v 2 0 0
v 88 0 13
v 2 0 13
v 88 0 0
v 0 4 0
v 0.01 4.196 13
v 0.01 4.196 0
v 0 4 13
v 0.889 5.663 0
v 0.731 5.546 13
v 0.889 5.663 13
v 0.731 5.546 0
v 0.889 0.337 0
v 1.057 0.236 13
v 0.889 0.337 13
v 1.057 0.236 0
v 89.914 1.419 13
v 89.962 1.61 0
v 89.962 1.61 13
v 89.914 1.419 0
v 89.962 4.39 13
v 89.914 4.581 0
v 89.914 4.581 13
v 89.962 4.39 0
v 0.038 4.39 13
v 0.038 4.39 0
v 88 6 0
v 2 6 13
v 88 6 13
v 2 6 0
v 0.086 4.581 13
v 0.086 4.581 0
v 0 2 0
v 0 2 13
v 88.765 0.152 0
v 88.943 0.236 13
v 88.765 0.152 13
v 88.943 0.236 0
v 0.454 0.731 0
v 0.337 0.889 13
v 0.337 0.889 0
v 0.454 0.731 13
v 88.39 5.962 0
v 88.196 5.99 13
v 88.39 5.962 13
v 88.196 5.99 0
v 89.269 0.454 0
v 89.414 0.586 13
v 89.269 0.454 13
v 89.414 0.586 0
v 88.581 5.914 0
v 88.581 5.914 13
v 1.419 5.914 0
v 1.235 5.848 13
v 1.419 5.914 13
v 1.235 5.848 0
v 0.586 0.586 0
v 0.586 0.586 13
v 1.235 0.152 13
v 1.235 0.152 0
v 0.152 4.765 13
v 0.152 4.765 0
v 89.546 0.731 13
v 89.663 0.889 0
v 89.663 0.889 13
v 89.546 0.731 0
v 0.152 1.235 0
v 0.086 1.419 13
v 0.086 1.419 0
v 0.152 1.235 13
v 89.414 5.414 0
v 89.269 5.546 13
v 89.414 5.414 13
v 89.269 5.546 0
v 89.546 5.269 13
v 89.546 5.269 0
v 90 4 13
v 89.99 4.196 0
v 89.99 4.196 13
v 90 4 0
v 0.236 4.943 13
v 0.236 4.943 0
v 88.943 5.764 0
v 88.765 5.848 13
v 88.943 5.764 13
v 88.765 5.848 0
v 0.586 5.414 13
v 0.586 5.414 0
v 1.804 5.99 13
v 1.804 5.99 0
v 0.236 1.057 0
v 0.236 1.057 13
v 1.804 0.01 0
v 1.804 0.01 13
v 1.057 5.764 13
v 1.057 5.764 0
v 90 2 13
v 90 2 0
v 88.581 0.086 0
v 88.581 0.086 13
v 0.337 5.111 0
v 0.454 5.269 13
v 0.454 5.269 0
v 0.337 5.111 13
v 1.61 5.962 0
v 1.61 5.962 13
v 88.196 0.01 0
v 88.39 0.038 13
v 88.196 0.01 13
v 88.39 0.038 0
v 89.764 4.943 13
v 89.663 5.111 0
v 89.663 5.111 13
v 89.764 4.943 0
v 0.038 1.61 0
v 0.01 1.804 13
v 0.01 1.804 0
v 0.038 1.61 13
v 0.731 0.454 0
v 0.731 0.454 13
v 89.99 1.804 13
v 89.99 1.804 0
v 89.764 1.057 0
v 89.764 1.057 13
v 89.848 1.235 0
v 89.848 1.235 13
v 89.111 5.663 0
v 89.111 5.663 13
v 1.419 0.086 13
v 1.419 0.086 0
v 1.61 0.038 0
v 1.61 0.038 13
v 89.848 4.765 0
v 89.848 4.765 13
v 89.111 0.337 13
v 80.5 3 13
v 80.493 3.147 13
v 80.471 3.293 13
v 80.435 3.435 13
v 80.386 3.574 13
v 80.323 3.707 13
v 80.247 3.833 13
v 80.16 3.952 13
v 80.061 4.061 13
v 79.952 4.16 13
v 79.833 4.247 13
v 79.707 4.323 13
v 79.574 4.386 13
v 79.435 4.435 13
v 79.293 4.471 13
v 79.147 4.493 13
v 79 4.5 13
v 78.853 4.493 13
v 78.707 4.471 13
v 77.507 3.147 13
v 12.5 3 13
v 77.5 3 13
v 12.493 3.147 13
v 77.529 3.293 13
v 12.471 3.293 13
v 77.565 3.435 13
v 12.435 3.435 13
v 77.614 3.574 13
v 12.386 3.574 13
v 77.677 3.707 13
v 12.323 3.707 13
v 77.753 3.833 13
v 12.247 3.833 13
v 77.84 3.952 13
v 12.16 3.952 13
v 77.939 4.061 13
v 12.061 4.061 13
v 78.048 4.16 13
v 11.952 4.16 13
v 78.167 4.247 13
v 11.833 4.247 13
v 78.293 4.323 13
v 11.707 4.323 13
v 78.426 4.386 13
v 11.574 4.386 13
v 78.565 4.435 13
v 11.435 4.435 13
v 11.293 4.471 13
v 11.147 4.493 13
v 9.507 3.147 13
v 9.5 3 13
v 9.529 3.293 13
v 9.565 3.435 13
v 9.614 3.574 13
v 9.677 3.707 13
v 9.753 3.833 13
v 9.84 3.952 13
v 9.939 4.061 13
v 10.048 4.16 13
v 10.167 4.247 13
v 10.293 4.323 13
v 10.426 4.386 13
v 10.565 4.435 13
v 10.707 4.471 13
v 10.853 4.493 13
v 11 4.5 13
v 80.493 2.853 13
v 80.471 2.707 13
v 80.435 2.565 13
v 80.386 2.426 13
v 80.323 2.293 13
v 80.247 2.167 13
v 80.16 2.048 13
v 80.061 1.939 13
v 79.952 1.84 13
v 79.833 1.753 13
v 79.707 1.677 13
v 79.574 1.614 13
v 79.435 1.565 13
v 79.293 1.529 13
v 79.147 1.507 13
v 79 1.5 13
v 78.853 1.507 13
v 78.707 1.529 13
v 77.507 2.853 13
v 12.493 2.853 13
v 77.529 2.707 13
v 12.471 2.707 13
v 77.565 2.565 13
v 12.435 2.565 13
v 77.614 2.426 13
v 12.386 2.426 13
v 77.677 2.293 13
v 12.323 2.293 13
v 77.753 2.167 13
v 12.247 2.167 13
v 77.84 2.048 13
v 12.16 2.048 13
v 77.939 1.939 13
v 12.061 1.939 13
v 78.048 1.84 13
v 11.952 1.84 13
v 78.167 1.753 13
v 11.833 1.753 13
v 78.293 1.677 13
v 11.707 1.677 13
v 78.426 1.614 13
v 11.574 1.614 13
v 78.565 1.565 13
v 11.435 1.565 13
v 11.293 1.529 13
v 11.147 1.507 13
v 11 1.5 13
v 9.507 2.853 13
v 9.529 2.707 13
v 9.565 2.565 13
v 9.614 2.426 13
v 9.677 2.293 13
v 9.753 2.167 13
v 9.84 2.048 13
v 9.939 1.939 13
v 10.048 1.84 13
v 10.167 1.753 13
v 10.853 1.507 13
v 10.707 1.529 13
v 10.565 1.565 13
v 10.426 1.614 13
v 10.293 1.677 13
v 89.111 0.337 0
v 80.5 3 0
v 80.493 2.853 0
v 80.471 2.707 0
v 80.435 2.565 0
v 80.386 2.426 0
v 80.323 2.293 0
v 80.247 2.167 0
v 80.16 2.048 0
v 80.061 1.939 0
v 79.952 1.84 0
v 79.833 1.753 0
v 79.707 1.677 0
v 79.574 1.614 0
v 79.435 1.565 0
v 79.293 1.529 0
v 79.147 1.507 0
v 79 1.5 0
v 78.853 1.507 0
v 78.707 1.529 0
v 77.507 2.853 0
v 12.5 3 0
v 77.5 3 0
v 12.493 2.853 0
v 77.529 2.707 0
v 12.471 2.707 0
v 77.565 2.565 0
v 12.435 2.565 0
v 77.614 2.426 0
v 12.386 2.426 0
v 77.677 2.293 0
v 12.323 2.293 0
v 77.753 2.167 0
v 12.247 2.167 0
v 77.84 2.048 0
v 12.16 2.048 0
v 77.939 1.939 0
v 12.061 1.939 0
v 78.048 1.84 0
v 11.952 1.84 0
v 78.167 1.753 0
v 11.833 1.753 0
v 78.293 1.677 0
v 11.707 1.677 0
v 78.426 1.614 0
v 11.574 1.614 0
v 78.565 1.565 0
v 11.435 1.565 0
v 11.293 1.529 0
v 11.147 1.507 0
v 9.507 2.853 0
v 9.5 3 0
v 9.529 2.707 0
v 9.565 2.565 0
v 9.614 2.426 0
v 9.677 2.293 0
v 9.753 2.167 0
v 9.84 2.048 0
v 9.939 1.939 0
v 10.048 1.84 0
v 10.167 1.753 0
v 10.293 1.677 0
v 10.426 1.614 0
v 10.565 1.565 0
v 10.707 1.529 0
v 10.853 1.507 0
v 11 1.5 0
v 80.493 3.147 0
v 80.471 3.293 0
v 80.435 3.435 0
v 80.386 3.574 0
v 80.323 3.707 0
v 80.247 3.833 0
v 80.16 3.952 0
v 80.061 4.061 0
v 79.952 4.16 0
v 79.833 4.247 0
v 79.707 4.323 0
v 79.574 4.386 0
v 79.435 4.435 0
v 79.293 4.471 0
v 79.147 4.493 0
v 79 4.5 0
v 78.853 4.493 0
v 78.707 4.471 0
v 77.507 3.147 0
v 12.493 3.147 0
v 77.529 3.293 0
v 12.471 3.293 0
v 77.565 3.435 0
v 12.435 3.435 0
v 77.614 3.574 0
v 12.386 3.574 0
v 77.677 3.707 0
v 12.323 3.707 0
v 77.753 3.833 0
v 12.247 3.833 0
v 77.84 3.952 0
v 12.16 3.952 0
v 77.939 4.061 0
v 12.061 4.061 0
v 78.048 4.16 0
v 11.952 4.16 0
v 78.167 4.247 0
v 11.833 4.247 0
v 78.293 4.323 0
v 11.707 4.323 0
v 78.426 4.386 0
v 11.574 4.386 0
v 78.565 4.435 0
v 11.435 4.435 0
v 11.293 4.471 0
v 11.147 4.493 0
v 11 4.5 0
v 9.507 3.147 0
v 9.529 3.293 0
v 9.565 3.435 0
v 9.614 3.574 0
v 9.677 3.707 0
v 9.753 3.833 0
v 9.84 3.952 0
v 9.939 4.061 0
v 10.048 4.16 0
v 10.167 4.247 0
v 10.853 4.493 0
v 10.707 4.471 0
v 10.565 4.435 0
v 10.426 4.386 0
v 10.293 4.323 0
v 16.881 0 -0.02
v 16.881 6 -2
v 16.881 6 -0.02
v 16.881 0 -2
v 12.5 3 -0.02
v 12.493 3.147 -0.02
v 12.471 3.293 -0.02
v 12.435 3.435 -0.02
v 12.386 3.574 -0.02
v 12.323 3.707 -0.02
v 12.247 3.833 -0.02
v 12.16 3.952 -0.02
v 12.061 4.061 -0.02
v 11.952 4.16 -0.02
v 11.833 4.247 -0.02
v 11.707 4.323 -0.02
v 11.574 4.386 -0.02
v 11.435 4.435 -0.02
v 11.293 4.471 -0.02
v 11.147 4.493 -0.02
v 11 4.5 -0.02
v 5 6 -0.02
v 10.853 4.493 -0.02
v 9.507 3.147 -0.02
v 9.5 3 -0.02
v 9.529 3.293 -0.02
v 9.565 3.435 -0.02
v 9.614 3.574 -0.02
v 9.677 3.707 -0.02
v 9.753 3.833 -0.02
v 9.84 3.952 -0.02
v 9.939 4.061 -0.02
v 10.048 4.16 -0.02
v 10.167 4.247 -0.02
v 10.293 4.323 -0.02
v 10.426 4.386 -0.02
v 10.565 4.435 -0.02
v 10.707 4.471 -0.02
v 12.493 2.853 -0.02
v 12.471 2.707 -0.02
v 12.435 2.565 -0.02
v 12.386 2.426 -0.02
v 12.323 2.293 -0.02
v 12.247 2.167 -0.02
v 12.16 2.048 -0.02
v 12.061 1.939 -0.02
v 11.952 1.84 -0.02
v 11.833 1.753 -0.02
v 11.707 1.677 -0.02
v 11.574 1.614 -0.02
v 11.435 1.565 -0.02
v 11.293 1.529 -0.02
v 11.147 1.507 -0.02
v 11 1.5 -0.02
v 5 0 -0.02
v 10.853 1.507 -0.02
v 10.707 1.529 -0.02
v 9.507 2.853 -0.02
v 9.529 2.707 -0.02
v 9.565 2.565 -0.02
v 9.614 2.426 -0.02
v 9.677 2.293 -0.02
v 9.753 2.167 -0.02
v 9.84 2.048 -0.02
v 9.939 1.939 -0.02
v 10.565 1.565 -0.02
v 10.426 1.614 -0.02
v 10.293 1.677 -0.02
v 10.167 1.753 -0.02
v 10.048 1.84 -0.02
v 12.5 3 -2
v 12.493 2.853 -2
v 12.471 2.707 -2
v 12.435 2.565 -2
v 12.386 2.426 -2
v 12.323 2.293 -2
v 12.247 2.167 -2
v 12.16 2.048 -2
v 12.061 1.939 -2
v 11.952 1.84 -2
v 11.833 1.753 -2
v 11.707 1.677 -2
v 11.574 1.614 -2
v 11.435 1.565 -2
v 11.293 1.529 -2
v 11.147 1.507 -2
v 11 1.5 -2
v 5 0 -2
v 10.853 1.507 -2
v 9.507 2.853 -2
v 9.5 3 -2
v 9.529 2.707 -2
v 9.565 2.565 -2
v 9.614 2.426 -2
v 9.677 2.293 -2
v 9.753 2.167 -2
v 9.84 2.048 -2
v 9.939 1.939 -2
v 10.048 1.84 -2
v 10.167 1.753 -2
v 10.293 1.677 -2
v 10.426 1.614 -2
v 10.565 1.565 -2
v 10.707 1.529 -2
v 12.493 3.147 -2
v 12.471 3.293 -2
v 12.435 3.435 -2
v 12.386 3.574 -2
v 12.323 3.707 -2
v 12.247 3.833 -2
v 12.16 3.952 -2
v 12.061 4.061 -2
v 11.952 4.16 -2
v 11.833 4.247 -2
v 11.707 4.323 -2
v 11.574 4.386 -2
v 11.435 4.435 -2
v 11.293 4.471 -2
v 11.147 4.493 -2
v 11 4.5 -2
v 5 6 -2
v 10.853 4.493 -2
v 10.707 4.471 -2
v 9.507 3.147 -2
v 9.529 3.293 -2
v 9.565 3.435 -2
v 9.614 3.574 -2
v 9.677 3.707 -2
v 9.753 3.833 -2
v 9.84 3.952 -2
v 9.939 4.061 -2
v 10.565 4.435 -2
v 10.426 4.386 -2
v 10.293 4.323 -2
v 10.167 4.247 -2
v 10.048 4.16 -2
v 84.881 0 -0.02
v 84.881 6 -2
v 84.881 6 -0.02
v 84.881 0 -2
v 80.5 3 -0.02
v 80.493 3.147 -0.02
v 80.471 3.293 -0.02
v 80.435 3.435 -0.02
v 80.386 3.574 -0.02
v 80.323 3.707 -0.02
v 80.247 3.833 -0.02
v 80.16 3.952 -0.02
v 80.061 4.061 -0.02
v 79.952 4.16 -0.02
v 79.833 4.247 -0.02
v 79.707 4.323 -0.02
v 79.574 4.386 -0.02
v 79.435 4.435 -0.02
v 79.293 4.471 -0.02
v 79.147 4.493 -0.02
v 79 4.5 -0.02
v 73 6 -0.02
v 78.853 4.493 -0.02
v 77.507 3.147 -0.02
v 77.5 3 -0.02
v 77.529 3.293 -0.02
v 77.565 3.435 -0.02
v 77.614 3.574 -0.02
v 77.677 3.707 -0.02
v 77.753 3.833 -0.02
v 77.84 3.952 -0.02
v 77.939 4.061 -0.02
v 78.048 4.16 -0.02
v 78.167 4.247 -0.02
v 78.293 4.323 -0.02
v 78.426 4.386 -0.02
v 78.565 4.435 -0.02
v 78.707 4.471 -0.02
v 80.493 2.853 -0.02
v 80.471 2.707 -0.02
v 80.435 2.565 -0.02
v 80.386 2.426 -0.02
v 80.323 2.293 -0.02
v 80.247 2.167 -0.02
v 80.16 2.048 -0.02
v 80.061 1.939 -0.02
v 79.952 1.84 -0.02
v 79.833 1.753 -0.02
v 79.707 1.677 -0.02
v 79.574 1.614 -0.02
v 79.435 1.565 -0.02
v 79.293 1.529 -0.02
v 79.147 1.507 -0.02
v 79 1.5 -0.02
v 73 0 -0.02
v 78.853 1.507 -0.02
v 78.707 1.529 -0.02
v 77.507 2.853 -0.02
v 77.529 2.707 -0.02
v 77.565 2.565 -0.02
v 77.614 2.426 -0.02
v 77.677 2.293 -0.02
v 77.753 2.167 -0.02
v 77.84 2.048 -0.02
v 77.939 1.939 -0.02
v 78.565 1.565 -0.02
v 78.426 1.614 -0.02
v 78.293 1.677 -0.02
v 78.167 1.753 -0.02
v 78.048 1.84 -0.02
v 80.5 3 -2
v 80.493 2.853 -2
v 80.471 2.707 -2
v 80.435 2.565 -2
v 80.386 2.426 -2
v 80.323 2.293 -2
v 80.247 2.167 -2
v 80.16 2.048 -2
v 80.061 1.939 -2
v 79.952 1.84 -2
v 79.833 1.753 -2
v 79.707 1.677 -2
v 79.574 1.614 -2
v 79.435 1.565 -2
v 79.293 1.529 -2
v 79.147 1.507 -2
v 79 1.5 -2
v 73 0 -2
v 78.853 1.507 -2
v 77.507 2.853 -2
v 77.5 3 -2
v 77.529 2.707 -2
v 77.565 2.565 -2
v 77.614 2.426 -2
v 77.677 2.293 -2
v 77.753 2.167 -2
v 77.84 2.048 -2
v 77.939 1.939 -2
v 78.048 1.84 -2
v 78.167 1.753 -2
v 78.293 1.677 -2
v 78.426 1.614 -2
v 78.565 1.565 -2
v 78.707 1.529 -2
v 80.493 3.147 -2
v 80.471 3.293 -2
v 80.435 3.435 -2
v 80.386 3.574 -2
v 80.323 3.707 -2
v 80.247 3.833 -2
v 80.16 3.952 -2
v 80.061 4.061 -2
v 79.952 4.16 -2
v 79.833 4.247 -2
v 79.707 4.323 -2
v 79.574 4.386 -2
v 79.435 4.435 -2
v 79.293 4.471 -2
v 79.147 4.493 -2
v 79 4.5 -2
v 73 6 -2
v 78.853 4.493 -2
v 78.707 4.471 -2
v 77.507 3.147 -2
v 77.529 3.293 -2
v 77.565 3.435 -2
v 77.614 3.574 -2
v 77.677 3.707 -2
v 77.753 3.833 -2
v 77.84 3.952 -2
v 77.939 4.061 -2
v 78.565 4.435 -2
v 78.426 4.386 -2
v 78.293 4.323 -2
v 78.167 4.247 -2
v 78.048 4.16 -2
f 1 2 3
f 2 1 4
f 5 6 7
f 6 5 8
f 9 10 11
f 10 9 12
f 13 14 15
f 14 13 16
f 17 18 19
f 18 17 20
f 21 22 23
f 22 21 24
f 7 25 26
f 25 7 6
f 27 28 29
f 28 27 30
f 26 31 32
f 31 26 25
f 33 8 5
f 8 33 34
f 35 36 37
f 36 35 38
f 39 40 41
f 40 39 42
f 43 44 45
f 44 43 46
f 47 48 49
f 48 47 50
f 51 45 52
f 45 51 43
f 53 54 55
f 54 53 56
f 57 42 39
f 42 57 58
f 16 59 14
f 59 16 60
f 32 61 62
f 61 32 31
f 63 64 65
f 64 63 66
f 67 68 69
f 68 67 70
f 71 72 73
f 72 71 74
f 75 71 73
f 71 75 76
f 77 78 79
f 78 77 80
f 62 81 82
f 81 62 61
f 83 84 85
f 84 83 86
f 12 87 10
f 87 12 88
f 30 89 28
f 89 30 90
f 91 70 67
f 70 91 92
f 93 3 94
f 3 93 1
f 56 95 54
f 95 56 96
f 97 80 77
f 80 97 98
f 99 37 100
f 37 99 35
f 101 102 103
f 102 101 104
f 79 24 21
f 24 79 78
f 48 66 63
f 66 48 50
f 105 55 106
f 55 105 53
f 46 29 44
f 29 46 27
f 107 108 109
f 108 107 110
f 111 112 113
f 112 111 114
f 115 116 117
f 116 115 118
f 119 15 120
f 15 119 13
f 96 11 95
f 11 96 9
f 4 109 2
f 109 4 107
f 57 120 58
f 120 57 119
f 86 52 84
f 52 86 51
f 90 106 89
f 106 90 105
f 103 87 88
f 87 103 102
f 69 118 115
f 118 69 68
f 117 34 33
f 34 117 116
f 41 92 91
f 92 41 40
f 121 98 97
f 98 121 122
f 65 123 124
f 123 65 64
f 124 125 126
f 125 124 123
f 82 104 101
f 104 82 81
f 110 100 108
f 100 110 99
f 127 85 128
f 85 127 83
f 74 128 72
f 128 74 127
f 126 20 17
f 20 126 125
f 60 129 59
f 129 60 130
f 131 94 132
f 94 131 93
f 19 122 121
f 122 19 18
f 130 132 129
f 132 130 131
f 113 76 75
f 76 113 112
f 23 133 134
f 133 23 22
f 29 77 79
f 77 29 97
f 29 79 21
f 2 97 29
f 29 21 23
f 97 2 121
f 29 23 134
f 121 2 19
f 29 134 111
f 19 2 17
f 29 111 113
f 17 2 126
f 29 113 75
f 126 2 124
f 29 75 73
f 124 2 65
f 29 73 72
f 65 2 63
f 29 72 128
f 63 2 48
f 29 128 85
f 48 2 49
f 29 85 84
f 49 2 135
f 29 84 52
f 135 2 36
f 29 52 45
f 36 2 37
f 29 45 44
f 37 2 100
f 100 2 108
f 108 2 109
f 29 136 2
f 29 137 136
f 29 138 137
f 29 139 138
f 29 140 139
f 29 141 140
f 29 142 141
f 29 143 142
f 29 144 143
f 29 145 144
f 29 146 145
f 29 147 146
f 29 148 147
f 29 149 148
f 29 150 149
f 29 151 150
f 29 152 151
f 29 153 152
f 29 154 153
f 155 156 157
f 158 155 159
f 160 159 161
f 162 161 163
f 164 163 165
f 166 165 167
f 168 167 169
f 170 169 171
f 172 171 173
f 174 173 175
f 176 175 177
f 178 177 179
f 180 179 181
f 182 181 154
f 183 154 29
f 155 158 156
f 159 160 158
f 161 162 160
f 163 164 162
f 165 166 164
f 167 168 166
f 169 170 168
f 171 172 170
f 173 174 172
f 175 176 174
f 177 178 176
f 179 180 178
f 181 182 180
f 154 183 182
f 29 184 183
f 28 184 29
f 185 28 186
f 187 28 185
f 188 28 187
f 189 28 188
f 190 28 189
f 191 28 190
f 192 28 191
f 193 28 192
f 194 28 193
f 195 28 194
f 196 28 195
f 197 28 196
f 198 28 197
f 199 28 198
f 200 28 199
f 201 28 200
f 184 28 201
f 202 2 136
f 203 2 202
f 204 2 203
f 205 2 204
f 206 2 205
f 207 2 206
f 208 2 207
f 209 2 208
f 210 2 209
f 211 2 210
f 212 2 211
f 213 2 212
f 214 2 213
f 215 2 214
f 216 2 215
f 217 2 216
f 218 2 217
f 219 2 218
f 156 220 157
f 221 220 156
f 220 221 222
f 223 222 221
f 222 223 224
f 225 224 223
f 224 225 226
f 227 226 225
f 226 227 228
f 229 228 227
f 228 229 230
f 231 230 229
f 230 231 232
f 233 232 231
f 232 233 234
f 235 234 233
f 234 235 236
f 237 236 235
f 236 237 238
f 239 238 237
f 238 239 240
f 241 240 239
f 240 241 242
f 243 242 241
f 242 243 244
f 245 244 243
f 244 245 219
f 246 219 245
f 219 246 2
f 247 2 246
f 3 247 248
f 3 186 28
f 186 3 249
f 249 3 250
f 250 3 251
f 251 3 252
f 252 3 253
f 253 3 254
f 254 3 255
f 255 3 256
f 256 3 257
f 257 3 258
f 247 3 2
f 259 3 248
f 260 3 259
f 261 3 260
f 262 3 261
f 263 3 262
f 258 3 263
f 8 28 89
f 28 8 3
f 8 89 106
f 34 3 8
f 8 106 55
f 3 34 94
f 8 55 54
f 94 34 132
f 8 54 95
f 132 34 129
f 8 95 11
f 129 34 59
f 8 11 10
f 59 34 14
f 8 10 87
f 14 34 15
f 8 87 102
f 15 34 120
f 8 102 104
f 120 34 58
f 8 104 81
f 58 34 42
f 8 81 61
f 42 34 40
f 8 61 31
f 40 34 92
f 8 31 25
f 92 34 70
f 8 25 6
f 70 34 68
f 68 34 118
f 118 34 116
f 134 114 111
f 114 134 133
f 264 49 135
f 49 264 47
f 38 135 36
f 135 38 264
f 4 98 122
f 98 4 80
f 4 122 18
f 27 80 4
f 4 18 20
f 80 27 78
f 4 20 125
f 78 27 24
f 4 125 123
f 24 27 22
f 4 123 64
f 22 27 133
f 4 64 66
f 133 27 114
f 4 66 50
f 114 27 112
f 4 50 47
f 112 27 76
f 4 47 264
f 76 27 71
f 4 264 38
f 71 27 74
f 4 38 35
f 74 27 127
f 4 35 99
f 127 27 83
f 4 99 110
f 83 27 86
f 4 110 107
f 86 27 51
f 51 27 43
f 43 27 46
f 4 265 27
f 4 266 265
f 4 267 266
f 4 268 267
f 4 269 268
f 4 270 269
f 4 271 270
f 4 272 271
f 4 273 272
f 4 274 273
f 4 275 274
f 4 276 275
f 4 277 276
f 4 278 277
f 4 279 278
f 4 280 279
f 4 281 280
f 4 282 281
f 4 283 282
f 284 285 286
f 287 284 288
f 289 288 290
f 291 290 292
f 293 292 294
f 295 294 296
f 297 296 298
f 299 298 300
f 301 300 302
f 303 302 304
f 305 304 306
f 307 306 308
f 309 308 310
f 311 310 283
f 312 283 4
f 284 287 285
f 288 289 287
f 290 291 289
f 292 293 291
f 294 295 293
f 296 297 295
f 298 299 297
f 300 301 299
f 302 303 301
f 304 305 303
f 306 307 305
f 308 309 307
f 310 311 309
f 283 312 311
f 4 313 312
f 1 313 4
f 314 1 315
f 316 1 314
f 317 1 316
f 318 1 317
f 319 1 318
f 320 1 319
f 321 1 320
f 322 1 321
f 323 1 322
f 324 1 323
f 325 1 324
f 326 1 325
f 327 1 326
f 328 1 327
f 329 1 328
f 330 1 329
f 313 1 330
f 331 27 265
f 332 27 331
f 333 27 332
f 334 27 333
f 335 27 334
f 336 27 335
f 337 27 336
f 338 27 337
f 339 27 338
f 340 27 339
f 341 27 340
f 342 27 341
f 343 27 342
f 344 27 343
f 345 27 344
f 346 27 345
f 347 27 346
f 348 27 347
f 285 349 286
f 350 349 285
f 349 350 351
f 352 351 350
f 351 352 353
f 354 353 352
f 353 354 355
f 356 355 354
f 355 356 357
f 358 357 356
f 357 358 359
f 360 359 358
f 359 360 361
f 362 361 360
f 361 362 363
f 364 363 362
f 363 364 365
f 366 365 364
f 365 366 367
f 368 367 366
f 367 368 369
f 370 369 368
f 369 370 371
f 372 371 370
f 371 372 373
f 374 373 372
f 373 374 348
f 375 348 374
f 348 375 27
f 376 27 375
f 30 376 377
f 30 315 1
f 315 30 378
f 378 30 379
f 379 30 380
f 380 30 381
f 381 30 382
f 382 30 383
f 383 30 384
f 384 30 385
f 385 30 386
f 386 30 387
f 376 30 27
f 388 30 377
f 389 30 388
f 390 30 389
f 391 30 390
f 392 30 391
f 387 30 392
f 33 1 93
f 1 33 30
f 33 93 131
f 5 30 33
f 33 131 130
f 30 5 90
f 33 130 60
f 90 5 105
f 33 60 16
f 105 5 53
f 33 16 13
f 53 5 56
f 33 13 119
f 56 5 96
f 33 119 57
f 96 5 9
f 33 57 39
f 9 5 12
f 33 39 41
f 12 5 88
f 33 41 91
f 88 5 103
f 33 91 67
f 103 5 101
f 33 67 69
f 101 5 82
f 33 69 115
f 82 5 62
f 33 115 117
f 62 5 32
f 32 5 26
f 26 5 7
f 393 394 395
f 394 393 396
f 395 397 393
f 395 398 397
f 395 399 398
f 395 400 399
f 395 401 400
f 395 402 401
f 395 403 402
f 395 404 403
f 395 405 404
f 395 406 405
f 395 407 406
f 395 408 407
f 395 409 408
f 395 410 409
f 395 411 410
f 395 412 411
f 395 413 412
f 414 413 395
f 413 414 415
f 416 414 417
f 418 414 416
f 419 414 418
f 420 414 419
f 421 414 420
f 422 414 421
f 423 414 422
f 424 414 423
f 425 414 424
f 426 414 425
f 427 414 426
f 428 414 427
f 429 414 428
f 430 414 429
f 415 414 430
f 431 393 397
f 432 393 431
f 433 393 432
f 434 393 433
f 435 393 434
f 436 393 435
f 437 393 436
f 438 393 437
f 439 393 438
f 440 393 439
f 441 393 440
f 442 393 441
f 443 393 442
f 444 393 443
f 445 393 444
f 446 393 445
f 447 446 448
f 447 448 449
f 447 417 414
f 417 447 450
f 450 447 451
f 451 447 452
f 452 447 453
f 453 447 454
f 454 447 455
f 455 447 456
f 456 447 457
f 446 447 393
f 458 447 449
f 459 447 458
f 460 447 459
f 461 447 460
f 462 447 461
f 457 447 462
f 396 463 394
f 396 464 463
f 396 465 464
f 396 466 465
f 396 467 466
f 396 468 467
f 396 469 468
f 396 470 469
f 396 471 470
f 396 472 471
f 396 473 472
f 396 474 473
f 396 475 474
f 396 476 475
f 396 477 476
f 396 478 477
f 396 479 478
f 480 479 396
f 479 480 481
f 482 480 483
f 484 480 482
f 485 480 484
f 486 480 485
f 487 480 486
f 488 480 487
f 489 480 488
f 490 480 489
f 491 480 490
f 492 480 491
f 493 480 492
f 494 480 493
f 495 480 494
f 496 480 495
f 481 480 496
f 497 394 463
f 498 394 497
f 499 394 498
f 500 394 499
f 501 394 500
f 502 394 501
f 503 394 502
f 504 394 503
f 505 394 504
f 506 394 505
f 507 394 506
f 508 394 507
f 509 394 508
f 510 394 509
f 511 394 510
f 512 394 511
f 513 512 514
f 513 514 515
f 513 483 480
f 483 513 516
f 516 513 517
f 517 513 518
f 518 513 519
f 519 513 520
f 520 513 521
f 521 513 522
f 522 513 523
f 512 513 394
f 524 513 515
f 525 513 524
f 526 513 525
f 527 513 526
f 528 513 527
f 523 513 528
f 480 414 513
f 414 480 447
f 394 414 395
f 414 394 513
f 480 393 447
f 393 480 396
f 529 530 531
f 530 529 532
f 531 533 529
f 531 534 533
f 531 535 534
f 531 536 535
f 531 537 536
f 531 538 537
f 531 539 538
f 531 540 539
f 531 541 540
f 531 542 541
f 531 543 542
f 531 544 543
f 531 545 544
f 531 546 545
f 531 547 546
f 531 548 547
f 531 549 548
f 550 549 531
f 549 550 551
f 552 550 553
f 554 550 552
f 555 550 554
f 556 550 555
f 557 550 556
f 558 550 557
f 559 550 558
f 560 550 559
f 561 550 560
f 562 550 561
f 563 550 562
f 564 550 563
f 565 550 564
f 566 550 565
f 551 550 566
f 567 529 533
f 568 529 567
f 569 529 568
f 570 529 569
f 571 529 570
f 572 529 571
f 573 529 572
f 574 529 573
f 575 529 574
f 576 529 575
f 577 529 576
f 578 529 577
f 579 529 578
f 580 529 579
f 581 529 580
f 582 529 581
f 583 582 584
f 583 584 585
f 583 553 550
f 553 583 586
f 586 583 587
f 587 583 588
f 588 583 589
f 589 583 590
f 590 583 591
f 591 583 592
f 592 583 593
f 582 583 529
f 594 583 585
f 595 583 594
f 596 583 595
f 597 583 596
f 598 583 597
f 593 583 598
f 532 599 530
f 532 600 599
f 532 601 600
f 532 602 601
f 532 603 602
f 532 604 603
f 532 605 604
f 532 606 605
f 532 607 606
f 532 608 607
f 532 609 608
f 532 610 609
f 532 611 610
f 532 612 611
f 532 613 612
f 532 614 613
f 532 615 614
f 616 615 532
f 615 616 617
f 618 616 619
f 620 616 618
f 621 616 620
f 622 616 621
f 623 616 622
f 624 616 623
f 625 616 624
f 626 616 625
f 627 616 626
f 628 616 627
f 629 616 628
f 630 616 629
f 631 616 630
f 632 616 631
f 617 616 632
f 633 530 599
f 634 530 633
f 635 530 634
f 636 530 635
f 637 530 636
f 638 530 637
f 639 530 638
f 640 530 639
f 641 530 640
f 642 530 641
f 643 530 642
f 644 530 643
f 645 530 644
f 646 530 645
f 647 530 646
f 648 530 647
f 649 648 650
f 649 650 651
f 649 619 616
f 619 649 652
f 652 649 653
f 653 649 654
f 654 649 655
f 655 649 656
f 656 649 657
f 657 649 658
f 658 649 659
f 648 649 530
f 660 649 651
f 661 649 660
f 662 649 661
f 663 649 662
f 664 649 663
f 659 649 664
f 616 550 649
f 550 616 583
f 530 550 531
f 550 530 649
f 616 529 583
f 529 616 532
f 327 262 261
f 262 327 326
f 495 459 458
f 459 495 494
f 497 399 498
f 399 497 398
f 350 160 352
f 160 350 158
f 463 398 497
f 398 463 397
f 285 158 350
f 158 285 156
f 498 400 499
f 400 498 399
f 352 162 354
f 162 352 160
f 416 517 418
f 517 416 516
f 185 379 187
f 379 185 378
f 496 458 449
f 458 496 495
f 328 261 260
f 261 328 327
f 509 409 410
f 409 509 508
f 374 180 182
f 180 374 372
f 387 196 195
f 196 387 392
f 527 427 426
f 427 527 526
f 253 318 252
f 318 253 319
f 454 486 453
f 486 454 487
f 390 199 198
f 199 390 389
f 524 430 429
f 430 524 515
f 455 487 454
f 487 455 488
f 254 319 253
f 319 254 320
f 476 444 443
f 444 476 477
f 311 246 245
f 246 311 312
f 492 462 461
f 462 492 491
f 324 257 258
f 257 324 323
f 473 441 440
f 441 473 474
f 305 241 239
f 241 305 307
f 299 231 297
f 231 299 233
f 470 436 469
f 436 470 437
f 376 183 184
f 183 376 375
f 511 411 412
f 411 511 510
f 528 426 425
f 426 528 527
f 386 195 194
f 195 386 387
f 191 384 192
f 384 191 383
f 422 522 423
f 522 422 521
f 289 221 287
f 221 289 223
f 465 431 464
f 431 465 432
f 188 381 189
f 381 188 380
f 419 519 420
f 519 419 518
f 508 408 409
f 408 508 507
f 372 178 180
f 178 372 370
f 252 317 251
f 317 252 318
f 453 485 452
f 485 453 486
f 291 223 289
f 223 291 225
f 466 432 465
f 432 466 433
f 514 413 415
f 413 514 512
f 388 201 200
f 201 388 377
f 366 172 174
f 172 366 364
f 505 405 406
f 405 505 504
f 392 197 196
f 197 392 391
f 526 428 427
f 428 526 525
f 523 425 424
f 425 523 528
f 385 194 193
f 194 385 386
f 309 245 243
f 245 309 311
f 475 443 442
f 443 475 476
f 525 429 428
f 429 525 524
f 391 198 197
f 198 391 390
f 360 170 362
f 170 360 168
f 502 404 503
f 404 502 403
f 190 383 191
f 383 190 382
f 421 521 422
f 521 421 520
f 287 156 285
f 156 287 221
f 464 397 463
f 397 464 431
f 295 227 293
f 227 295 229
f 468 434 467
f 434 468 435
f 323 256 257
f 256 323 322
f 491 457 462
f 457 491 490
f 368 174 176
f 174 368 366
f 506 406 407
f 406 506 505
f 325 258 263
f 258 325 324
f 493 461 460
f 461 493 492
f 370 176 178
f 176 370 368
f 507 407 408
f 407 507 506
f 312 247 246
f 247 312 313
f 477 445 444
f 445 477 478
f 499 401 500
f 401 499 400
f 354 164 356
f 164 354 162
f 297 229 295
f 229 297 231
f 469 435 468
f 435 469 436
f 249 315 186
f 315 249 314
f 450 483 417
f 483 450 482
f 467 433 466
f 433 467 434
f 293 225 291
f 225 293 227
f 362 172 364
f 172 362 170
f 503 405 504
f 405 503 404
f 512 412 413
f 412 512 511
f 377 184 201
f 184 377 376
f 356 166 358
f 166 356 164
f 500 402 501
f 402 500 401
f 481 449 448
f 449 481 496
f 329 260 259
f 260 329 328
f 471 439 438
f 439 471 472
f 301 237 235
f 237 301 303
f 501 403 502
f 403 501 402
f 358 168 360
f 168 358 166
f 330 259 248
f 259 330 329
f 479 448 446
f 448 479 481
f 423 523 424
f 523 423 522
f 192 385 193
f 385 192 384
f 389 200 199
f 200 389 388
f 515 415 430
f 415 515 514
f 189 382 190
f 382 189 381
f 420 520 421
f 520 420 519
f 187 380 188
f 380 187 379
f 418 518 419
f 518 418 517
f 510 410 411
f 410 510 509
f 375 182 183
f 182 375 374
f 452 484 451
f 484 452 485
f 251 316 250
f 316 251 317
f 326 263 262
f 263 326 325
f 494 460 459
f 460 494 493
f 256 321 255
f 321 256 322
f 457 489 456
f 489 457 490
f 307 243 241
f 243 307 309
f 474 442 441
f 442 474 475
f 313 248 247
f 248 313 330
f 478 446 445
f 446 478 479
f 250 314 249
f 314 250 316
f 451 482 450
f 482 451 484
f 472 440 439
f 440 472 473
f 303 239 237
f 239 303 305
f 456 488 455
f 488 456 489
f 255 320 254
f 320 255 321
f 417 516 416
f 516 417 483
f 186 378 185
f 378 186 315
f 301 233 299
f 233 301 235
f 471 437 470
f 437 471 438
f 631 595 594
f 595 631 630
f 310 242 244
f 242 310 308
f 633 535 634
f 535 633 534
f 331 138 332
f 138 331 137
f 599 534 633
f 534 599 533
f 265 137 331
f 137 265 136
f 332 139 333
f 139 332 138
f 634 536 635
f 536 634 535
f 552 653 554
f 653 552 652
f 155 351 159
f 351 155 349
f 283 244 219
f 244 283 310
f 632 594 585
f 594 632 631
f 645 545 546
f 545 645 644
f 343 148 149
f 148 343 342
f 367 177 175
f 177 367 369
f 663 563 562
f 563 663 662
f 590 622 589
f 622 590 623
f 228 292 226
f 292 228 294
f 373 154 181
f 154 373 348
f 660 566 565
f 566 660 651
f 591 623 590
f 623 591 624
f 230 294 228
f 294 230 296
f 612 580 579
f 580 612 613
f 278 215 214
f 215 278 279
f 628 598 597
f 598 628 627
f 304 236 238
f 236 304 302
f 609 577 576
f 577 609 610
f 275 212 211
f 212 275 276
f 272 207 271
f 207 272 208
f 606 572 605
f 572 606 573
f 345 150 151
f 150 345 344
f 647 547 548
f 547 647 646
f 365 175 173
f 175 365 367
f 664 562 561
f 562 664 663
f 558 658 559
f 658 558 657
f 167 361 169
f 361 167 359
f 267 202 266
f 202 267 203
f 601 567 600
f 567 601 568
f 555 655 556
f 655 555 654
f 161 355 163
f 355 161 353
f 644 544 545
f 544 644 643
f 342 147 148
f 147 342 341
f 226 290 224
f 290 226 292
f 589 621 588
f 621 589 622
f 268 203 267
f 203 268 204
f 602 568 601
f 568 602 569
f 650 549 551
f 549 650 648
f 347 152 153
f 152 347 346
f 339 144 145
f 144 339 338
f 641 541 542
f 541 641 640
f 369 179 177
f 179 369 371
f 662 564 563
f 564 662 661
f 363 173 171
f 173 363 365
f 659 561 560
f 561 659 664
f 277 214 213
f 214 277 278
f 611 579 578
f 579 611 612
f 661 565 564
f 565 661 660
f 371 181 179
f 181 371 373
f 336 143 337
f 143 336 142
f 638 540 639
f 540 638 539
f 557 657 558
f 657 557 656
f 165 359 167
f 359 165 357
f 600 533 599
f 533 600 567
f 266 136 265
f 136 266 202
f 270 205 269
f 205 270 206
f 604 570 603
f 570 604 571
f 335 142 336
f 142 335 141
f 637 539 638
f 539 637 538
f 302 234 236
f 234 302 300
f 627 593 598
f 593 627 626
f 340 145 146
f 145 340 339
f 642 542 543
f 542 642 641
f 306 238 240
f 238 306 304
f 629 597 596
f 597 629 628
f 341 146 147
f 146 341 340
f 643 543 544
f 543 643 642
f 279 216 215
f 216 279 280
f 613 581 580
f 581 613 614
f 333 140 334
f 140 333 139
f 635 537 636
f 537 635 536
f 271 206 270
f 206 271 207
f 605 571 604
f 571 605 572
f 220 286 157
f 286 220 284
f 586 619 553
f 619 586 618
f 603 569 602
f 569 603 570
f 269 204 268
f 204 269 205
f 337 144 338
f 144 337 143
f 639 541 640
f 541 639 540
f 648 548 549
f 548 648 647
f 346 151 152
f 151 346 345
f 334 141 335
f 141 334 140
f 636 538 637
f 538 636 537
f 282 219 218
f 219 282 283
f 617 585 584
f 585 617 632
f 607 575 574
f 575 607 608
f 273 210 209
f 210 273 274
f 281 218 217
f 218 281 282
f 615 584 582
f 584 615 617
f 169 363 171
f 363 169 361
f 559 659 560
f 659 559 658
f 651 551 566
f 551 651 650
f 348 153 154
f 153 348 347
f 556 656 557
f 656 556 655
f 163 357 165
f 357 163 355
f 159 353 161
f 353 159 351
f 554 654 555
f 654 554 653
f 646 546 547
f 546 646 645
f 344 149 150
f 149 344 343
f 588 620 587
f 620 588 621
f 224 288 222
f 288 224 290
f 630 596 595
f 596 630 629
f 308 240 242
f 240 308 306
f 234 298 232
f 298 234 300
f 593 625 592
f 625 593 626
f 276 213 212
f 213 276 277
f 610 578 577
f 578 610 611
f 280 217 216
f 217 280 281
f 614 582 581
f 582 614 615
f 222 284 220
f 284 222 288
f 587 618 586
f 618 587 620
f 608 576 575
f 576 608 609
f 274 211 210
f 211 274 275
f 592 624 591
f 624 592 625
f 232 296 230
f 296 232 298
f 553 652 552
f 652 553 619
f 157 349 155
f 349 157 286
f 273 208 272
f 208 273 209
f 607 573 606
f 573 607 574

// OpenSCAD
$fn=64;

difference() {
  union() {
    minkowski() {
      translate([2, 2, 0]) cube([90-2*2, 6-2*2, 12]);
      cylinder(h=1, r=2);
    }
    translate([5, 0, -2]) cube([12/1.01, 6, 2/1.01]);
    translate([90-5-12, 0, -2]) cube([12/1.01, 6, 2/1.01]);
  }
  union() {
    translate([11, 3, -2]) cylinder(h=15, d=3);
    translate([90-5-12+6, 3, -2]) cylinder(h=15, d=3);
  }
}
